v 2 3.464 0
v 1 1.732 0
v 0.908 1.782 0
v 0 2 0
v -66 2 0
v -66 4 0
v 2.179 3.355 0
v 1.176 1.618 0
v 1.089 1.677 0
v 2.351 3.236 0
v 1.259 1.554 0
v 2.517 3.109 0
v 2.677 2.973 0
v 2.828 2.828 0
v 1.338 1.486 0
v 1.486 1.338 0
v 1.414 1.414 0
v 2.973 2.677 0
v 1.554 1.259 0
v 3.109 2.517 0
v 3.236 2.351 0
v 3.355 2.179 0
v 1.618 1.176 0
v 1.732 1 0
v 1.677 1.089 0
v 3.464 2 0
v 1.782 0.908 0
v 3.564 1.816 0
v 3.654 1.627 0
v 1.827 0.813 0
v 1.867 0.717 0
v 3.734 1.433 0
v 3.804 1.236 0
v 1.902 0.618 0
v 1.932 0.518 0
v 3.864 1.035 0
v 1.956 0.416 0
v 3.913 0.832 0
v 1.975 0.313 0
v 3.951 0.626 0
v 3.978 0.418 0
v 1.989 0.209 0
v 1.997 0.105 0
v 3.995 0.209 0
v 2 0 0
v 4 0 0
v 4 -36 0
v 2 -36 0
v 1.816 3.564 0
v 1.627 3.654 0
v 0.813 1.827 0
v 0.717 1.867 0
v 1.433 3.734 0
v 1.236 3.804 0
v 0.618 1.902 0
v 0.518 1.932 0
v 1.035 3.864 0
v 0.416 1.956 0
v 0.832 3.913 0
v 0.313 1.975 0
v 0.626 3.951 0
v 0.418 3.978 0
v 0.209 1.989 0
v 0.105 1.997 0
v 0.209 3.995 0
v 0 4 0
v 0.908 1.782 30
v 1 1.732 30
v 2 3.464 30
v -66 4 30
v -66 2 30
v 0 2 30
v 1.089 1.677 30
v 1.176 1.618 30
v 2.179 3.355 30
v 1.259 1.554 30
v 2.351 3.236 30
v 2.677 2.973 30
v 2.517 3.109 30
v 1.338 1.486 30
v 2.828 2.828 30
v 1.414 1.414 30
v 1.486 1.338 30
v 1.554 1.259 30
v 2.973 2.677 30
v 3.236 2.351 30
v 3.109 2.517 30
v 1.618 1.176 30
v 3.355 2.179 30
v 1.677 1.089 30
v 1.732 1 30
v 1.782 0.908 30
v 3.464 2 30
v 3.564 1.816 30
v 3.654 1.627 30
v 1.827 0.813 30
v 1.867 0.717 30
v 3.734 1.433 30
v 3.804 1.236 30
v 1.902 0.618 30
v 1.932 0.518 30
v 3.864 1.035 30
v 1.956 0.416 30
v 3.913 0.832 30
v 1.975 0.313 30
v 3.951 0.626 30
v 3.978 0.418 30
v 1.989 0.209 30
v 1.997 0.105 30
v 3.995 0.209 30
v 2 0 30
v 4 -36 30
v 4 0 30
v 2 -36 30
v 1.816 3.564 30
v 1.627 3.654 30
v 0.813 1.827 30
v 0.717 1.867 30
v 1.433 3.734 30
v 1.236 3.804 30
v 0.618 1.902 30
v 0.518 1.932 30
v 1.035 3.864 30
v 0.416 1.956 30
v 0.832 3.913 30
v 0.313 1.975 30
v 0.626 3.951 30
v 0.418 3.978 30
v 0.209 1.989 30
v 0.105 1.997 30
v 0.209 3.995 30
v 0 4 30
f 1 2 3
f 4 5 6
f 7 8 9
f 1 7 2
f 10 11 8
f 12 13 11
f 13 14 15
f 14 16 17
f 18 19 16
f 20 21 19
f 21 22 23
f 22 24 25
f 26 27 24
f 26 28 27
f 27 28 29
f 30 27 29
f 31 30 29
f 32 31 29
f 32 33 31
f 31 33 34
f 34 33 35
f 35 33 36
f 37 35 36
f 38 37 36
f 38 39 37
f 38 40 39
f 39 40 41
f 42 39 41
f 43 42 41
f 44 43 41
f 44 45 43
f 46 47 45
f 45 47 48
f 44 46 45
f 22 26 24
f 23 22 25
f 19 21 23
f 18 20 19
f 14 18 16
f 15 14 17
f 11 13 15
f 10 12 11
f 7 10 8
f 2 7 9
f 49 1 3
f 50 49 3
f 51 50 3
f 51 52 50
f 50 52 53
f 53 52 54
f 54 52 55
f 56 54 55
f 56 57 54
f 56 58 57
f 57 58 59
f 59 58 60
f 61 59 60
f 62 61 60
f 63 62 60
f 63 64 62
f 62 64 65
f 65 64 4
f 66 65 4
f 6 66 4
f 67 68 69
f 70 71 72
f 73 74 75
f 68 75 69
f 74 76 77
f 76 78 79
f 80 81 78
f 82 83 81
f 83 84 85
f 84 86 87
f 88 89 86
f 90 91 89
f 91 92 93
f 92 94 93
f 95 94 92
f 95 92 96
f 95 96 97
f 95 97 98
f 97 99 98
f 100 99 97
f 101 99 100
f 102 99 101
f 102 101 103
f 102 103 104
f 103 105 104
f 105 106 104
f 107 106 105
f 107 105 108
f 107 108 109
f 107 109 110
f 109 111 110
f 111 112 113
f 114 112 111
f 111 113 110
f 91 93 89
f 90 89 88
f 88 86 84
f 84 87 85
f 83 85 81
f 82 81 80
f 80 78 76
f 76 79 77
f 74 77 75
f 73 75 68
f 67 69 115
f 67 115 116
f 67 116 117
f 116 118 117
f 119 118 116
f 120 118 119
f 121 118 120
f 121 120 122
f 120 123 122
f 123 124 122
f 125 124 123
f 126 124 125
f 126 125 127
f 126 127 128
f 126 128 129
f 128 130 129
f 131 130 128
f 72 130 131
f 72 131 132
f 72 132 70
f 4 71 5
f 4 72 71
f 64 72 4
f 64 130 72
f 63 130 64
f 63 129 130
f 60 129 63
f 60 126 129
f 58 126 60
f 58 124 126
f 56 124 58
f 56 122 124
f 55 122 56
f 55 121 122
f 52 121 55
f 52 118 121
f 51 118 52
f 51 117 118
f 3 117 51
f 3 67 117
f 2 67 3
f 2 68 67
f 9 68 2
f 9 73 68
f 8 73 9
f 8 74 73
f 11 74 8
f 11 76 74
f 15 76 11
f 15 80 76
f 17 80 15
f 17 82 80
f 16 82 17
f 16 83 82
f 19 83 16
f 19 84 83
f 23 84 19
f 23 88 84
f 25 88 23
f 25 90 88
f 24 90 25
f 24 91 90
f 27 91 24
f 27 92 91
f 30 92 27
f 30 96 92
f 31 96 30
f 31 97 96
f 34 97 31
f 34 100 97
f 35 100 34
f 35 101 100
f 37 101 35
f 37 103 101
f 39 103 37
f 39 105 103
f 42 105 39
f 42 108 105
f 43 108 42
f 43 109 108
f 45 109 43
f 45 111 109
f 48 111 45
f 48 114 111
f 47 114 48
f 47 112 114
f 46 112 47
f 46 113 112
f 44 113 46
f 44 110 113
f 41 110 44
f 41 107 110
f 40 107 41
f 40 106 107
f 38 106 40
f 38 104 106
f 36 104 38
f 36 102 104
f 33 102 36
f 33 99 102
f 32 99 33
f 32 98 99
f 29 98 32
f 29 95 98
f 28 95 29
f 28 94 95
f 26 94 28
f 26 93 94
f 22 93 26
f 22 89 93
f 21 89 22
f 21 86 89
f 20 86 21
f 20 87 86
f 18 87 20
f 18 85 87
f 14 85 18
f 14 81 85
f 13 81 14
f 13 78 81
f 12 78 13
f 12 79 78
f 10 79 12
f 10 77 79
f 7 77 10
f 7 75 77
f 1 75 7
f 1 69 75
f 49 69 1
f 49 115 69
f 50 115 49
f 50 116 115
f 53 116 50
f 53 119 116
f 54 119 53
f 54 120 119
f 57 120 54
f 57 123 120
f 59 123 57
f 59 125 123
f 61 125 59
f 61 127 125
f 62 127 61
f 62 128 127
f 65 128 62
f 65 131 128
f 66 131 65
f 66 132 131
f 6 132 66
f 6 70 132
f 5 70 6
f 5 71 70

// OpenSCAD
// Precision Constant-Gauge Sheet-Metal L-Bracket
// Design parameters:
// - Outside Flange A: 70 mm
// - Outside Flange B: 40 mm
// - Width: 30 mm
// - Material Thickness: 2.0 mm
// - Inside Bend Radius: 2.0 mm
// - Bend Angle: 90 degrees
// - K-factor: 0.45

$fn = 120; // High resolution for smooth cylinder rendering

// Dimensions
thickness = 2.0;
inside_radius = 2.0;
k_factor = 0.45;
width = 30.0;
flange_a_outside = 70.0;
flange_b_outside = 40.0;

// Math Constants
pi = 3.14159265358979323846;

// Flat Pattern Calculations (Neutral-axis bend allowance)
l1 = flange_a_outside - (inside_radius + thickness); // Flat length of Flange A
l2 = flange_b_outside - (inside_radius + thickness); // Flat length of Flange B
neutral_radius = inside_radius + k_factor * thickness;
bend_allowance = (pi / 2.0) * neutral_radius; // 90 degree bend allowance
flat_length = l1 + l2 + bend_allowance;

// Print/Echo the precision sheet metal manifest
echo(str("MAKERBENCH-SHEETMETAL: {",
         "\"thickness_mm\": ", thickness, ", ",
         "\"bend_radius_mm\": ", inside_radius, ", ",
         "\"flat_length_mm\": ", flat_length,
         "}"));

// Render the 3D formed bracket
module bracket() {
    linear_extrude(height = width) {
        // Flange A (oriented along the negative X axis)
        translate([-l1, inside_radius])
            square([l1, thickness]);
        
        // Flange B (oriented along the negative Y axis)
        translate([inside_radius, -l2])
            square([thickness, l2]);
        
        // 90-degree formed bend sector
        intersection() {
            difference() {
                circle(r = inside_radius + thickness);
                circle(r = inside_radius);
            }
            square([inside_radius + thickness, inside_radius + thickness]);
        }
    }
}

bracket();
